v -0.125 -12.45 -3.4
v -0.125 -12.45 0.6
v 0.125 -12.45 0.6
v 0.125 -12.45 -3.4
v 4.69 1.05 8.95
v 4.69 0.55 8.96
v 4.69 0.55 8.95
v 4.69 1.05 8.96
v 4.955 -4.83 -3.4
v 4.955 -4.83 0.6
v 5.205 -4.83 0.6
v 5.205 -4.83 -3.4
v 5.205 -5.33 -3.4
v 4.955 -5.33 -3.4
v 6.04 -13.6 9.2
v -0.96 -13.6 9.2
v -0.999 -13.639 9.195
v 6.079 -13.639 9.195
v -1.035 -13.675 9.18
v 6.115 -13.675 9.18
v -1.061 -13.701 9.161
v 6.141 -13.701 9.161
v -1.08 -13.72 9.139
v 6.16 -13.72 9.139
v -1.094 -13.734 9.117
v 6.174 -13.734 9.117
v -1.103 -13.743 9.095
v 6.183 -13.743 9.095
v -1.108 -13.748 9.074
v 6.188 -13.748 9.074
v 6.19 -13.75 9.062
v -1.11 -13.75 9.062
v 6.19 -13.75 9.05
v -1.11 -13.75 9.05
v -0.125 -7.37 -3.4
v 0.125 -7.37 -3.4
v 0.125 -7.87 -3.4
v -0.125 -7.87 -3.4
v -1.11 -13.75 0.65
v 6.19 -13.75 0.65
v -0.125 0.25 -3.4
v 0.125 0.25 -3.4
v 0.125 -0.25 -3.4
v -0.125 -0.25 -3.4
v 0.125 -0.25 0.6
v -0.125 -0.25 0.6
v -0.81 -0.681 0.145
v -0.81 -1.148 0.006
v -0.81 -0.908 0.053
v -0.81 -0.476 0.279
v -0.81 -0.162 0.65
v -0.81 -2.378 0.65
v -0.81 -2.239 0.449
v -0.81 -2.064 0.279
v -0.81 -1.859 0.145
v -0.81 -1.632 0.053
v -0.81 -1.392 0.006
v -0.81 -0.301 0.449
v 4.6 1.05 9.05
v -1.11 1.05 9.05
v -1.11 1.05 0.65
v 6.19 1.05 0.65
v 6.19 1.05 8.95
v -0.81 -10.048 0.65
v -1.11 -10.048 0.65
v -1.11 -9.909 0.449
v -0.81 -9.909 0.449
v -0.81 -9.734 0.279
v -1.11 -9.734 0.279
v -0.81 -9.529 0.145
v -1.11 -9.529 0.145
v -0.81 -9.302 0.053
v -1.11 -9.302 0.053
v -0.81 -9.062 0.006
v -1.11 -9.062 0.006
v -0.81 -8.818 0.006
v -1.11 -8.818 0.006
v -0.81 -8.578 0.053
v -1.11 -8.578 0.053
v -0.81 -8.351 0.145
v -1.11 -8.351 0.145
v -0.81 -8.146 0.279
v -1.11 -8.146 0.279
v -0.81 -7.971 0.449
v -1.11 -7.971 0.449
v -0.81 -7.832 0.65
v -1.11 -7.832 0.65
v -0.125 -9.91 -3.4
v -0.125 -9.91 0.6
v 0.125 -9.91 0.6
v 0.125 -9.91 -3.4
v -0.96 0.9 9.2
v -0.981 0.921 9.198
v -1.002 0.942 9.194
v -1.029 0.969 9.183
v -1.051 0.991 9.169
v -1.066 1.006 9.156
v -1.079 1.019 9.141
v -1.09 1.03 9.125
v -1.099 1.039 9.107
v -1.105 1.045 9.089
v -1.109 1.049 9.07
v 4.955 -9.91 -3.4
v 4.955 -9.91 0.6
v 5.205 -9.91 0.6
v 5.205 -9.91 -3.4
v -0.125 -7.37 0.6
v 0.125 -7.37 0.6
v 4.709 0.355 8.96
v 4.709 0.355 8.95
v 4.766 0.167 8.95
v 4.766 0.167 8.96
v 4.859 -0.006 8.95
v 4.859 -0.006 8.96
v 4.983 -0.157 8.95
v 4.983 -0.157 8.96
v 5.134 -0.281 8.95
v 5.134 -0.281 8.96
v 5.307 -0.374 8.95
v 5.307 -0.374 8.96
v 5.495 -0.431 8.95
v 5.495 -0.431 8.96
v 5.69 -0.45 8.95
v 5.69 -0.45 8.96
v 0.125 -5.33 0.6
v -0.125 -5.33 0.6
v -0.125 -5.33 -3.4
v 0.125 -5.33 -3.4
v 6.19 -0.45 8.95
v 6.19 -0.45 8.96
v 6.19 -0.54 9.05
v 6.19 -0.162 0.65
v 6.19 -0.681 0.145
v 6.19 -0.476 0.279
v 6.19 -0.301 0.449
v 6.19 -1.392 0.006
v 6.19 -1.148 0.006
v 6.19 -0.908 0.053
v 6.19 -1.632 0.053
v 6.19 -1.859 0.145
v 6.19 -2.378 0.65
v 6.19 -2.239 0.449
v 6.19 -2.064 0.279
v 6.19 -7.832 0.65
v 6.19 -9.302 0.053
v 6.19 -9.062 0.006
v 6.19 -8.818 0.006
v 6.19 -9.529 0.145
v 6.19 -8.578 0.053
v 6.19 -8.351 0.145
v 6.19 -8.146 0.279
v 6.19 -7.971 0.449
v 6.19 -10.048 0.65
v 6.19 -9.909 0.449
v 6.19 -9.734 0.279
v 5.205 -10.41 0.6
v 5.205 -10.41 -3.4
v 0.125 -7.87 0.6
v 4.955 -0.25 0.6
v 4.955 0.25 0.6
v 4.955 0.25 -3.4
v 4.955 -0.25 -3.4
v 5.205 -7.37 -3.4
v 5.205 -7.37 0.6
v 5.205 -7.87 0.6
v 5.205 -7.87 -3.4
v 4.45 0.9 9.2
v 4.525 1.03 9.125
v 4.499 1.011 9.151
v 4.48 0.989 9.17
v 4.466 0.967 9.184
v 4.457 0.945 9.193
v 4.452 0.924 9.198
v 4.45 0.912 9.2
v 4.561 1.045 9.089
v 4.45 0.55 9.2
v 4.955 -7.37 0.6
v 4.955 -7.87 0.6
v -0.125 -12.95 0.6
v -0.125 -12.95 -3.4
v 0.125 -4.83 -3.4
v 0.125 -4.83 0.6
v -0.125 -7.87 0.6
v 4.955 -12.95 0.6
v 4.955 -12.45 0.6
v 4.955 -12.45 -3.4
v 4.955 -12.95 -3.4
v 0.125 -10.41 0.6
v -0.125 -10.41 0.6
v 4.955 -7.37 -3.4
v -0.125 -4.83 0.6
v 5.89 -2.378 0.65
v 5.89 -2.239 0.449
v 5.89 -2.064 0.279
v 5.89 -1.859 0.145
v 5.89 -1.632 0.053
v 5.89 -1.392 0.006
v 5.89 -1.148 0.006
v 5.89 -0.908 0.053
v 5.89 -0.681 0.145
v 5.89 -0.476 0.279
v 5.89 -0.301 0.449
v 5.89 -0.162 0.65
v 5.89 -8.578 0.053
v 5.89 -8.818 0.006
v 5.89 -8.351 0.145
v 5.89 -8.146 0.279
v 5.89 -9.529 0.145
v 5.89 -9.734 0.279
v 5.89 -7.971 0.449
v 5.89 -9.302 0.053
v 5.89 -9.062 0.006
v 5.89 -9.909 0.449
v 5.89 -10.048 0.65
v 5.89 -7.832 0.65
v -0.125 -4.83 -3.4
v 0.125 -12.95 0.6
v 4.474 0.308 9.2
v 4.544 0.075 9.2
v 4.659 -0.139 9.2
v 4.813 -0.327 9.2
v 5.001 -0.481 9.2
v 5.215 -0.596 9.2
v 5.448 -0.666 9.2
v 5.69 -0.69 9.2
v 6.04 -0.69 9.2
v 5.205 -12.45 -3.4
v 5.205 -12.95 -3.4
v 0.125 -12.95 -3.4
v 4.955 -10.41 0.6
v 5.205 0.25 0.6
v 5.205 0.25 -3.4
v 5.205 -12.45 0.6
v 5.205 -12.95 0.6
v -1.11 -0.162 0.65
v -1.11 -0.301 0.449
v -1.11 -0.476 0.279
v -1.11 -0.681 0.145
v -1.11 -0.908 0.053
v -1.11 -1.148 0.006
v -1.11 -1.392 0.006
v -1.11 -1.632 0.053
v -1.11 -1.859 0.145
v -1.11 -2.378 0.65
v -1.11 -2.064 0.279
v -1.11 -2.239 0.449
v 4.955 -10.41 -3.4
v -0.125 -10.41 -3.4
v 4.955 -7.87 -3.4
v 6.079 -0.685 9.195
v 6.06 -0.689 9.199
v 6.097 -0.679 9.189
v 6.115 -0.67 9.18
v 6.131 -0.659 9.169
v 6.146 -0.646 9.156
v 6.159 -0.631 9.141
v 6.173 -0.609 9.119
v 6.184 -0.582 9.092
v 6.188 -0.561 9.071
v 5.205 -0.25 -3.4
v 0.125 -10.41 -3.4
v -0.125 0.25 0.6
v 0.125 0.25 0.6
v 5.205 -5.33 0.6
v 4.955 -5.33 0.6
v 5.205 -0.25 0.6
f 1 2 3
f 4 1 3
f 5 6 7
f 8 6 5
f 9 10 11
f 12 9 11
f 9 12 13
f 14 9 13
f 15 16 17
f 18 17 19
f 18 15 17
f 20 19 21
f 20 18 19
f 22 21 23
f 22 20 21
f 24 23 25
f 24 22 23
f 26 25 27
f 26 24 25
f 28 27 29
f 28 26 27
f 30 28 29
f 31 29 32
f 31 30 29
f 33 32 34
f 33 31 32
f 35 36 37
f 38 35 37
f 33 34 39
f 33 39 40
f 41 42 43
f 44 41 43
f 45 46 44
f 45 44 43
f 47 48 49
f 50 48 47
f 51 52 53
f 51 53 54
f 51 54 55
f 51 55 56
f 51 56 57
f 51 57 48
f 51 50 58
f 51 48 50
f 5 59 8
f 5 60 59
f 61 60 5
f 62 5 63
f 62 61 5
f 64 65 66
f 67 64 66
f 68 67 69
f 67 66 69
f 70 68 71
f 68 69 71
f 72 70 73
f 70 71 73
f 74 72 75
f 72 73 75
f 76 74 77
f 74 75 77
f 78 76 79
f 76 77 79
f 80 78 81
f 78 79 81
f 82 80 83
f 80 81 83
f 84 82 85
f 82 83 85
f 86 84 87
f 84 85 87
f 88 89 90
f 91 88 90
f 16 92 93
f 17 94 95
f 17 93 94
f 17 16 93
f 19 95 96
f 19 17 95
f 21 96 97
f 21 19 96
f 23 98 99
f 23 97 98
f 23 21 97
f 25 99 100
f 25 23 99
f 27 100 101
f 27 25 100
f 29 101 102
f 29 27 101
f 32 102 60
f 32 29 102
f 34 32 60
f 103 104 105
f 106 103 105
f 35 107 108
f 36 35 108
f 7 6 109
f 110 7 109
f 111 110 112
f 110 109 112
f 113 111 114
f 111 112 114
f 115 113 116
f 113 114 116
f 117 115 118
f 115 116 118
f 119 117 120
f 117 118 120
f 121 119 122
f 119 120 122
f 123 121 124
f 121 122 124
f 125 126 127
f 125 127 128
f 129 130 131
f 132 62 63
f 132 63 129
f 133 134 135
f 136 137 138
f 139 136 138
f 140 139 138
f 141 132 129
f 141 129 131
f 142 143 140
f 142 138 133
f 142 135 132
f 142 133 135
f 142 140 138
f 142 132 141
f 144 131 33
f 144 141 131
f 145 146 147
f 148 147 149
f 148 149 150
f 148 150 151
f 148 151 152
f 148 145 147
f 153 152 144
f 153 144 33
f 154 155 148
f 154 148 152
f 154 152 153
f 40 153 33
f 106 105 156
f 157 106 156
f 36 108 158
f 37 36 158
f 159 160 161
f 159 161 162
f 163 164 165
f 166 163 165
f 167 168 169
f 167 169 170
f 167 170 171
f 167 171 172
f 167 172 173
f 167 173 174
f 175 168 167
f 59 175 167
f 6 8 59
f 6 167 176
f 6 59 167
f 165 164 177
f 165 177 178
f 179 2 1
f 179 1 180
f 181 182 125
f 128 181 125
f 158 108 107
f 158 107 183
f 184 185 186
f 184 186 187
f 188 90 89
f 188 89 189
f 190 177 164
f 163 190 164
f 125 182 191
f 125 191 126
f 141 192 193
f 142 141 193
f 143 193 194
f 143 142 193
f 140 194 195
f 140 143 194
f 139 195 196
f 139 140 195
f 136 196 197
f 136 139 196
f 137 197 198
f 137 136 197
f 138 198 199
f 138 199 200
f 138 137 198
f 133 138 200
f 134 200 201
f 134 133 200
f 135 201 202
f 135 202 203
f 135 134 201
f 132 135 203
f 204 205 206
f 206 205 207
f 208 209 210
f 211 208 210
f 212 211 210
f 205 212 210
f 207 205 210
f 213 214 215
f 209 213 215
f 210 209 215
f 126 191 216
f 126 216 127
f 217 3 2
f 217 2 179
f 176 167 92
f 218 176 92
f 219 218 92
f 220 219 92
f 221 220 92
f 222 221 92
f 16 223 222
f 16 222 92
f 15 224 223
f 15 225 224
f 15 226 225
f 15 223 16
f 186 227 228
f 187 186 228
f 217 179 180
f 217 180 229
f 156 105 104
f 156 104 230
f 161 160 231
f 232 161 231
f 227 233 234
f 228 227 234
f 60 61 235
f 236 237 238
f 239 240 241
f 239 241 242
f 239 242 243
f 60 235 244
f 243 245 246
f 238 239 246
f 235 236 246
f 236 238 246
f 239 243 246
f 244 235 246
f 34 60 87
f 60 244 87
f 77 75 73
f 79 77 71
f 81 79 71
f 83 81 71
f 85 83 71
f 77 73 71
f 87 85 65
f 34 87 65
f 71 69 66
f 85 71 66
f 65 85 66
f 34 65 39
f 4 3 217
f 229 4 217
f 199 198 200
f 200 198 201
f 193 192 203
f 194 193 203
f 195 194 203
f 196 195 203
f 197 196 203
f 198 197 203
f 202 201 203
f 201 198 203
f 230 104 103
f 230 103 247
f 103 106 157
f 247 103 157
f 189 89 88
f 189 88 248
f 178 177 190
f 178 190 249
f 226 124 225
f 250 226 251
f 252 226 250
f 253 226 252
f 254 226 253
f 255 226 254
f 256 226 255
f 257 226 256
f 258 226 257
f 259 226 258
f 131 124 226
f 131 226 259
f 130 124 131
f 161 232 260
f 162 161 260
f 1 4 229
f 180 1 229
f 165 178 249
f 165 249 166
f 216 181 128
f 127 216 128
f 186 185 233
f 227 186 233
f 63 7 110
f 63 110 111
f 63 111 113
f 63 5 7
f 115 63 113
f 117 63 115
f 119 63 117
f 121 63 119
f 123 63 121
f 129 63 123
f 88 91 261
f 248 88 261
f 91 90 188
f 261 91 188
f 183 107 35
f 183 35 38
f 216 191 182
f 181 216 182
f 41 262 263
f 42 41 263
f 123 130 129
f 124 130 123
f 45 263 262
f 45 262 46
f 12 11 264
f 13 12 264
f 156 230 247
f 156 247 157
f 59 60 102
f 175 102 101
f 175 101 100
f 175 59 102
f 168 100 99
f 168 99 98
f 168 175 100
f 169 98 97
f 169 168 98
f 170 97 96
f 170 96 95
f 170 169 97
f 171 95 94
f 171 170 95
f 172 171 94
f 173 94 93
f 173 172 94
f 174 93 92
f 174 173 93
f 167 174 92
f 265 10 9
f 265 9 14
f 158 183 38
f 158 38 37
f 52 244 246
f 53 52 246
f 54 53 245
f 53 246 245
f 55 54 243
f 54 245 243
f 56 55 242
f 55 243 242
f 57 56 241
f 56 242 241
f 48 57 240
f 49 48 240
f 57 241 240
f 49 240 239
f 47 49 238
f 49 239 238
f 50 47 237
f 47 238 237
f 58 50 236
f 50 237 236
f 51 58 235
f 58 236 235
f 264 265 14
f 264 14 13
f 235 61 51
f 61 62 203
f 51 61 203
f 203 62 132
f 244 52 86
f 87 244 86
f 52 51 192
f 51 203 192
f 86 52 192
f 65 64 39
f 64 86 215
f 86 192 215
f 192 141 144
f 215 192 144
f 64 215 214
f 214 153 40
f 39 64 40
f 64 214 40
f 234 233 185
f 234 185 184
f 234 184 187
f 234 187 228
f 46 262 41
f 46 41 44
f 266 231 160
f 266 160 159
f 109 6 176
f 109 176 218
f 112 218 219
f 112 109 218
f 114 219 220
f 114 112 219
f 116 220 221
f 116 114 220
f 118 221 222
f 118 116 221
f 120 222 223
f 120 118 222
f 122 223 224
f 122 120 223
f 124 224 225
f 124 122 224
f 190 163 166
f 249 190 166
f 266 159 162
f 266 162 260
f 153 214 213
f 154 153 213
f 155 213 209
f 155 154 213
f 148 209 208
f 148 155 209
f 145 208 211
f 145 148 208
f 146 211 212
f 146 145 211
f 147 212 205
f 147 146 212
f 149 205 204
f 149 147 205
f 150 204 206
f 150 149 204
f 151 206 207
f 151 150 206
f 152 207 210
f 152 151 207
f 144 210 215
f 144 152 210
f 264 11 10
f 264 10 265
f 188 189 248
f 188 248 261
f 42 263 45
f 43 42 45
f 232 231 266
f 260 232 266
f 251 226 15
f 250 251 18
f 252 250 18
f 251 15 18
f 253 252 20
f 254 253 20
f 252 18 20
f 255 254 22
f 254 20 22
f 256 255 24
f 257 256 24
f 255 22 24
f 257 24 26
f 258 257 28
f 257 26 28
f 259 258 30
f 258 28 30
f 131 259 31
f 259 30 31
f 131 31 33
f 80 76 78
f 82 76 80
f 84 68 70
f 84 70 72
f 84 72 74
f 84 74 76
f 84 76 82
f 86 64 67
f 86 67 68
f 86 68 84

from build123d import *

# Parameters (mm, degrees)
PAD002_DEPTH = 0.3
SKETCH_W     = 14.8
SKETCH_H     = 7.3
PAD_DEPTH    = 8.55
POCKET_DEPTH = 0.25
CHAMFER_SIZE = 0.24
FILLET_R     = 0.15
SKETCH001_W  = 0.5
SKETCH001_H  = 0.25
PAD001_DEPTH = 4
PAD003_DEPTH = 0.3


with BuildPart() as pad002:
    # Sketch003 → Pad002 (new body)
    with BuildSketch(Plane.YZ.offset(6.19)):
        with BuildLine():
            ThreePointArc((-10.21, 1.27), (-8.94, 0), (-7.67, 1.27))
            Line((-10.21, 1.27), (-7.67, 1.27))
        make_face()
        with BuildLine():
            ThreePointArc((-2.54, 1.27), (-1.27, 0), (0, 1.27))
            Line((-2.54, 1.27), (0, 1.27))
        make_face()
    extrude(amount=-PAD002_DEPTH)


with BuildPart() as fillet_body:
    # Sketch → Pad (new body)
    with BuildSketch(Plane(origin=(0, 0, 0.65), x_dir=(0, -1, 0), z_dir=(0, 0, 1))):
        with Locations((6.35, 2.54)):
            Rectangle(SKETCH_W, SKETCH_H)
    extrude(amount=PAD_DEPTH)

    # Sketch002 → Pocket (cut)
    with BuildSketch(Plane(origin=(0, 0, 9.2), x_dir=(0, -1, 0), z_dir=(0, 0, 1))):
        with BuildLine():
            ThreePointArc((-0.55, 4.69), (0.157107, 4.982893), (0.45, 5.690001))
            Line((0.45, 6.19), (0.45, 5.690001))
            Line((-1.05, 6.19), (0.45, 6.19))
            Line((-1.05, 4.69), (-1.05, 6.19))
            Line((-0.55, 4.69), (-1.05, 4.69))
        make_face()
    extrude(amount=-POCKET_DEPTH, mode=Mode.SUBTRACT)

    # Chamfer
    chamfer_edges = [fillet_body.edges().sort_by_distance(p)[0] for p in [
        (4.982893, -0.157107, 9.2),
        (5.94, -0.45, 9.2),
        (4.69, 0.8, 9.2),
    ]]
    chamfer(chamfer_edges, length=CHAMFER_SIZE)

    # Fillet
    fillet_edges = [fillet_body.edges().sort_by_distance(p)[0] for p in [
        (6.19, -7.22, 9.2),
        (1.67, 1.05, 9.2),
        (-1.11, -6.35, 9.2),
        (2.54, -13.75, 9.2),
    ]]
    fillet(fillet_edges, radius=FILLET_R)


with BuildPart() as pad001:
    # Sketch001 → Pad001 (new body)
    with BuildSketch(Plane(origin=(0, 0, 0.6), x_dir=(0, -1, 0), z_dir=(0, 0, 1))):
        Rectangle(SKETCH001_W, SKETCH001_H)
        with Locations((5.08, 0)):
            Rectangle(SKETCH001_W, SKETCH001_H)
        with Locations((0, 5.08)):
            Rectangle(SKETCH001_W, SKETCH001_H)
        with Locations((5.08, 5.08)):
            Rectangle(SKETCH001_W, SKETCH001_H)
        with Locations((7.62, 0)):
            Rectangle(SKETCH001_W, SKETCH001_H)
        with Locations((7.62, 5.08)):
            Rectangle(SKETCH001_W, SKETCH001_H)
        with Locations((10.16, 5.08)):
            Rectangle(SKETCH001_W, SKETCH001_H)
        with Locations((10.16, 0)):
            Rectangle(SKETCH001_W, SKETCH001_H)
        with Locations((12.7, 5.08)):
            Rectangle(SKETCH001_W, SKETCH001_H)
        with Locations((12.7, 0)):
            Rectangle(SKETCH001_W, SKETCH001_H)
    extrude(amount=-PAD001_DEPTH)


with BuildPart() as pad003_mp_cp:
    # Sketch004 → Pad003 (new body)
    with BuildSketch(Plane.YZ.offset(-1.11)):
        with BuildLine():
            ThreePointArc((-10.21, 1.27), (-8.94, 0), (-7.67, 1.27))
            Line((-10.21, 1.27), (-7.67, 1.27))
        make_face()
        with BuildLine():
            ThreePointArc((-2.54, 1.27), (-1.27, 0), (0, 1.27))
            Line((-2.54, 1.27), (0, 1.27))
        make_face()
    extrude(amount=PAD003_DEPTH)

    # Pad003_mp_cp: union Pad002, Fillet body, Pad001
    add(pad002.part)
    add(fillet_body.part)
    add(pad001.part)


solid = pad003_mp_cp.part
